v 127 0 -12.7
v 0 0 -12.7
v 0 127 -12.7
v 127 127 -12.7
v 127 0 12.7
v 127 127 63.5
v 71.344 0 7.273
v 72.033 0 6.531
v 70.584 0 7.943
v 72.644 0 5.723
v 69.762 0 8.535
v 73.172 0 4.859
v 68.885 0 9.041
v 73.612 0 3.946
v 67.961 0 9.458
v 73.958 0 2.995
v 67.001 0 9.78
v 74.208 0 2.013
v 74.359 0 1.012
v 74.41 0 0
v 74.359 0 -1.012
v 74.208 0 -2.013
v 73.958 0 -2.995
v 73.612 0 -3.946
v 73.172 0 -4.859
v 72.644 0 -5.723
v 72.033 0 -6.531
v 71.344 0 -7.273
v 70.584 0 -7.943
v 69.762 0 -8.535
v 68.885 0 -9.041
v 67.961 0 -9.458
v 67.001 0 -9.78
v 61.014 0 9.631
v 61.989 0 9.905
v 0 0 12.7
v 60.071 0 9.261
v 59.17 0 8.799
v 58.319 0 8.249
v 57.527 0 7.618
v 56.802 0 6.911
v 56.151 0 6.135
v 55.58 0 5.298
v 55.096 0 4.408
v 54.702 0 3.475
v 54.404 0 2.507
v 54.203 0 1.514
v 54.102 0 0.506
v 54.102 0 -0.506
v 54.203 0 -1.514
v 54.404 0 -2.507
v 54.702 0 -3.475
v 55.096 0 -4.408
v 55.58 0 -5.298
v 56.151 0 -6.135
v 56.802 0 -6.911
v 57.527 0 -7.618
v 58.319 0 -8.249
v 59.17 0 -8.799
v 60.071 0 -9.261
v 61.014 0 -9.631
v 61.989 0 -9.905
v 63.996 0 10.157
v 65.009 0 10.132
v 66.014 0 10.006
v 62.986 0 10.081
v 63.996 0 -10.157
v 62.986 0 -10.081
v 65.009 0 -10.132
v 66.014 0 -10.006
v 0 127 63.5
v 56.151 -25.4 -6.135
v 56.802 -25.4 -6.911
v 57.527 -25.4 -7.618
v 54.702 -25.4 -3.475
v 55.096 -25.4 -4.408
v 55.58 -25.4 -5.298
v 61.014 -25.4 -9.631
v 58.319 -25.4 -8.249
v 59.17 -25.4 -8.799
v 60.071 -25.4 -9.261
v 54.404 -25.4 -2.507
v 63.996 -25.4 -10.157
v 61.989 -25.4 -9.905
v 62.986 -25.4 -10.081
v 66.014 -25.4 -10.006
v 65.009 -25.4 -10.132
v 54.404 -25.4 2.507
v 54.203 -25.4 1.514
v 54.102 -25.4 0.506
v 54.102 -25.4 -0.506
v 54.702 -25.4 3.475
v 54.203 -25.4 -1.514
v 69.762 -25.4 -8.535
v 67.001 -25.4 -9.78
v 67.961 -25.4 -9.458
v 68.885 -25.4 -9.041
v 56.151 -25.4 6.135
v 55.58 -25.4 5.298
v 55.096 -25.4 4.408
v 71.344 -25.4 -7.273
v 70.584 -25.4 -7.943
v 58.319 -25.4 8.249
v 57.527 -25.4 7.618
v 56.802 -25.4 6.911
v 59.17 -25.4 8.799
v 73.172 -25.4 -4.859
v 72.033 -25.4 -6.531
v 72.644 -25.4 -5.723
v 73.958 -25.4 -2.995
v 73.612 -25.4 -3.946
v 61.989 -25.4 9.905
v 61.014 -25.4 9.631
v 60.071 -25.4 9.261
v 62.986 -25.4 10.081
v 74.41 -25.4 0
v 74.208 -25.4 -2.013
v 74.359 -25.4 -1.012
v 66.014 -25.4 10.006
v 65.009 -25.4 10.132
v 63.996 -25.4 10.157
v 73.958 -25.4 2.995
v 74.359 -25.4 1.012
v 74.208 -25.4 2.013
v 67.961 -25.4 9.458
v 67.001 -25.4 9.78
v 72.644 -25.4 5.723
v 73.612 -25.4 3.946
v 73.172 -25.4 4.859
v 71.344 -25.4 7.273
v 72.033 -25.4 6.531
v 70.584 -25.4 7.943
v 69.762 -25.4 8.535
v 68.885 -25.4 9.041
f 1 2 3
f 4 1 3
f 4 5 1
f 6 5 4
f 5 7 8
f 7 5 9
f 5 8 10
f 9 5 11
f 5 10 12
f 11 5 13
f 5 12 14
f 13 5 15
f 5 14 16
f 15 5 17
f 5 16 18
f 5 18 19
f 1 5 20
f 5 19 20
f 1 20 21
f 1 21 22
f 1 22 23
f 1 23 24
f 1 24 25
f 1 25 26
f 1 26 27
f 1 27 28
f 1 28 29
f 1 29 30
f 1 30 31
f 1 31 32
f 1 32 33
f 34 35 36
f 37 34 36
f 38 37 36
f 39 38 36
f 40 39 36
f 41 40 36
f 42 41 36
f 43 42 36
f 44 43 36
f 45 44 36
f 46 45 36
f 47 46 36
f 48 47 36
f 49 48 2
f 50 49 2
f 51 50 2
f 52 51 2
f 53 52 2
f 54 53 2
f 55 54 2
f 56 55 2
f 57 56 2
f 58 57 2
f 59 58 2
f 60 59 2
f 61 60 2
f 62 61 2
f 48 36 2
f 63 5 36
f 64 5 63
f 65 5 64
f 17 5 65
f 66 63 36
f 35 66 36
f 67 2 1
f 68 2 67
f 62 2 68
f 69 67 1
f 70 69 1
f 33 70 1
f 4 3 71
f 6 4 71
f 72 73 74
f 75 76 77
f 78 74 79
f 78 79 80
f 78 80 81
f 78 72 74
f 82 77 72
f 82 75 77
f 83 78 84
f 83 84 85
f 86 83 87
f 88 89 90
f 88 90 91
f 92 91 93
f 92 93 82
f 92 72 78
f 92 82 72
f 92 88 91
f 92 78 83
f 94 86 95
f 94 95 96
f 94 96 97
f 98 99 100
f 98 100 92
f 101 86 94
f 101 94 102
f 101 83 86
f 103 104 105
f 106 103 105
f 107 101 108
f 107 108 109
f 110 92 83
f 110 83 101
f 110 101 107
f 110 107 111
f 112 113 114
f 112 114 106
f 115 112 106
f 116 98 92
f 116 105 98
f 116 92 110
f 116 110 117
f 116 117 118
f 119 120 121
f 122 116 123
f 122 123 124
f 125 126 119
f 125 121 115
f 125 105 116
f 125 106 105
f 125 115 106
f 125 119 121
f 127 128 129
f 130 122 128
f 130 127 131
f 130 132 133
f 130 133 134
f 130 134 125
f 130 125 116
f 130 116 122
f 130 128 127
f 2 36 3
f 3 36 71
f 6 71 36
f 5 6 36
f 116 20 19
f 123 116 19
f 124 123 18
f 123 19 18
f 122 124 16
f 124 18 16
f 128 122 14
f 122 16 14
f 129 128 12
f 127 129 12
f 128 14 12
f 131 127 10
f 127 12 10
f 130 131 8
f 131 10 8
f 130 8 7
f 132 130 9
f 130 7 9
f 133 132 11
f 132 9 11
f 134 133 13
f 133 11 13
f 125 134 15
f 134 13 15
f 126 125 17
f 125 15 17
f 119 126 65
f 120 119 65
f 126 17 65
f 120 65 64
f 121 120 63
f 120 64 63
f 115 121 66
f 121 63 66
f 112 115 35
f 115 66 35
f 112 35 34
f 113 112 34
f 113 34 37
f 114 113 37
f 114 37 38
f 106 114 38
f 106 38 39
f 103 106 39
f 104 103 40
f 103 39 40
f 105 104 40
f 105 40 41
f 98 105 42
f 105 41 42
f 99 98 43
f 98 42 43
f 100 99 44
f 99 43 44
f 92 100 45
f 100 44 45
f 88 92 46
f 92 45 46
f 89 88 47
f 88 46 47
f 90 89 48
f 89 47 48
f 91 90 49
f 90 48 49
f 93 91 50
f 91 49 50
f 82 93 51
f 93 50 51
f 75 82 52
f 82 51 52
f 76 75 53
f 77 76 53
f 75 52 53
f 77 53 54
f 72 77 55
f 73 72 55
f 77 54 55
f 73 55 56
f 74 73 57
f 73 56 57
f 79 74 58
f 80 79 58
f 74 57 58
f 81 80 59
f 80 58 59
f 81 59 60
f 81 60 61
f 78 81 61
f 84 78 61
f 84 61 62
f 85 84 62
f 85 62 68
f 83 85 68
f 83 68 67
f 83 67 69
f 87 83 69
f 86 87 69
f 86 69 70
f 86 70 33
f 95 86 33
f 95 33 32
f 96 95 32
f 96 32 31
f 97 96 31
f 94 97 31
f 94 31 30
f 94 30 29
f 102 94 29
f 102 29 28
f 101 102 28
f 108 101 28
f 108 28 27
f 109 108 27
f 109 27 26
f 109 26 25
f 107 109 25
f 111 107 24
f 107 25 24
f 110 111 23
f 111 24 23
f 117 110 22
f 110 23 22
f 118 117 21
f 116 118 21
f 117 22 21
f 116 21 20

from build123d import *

# Parameters (mm, degrees)
F0_W     = 114.1541988105
F0_H     = 25.4
F1_DEPTH = 127
F2_R     = 10.16
F3_DEPTH = 25.4


# Not quite as in the source:
# - a feature names something its author has since deleted; it is built from what else it names


with BuildPart() as f1:
    # F0 (on Right) → F1 (new body)
    with BuildSketch(Plane.YZ):
        Polygon((127, 63.5), (0, 12.7), (12.8458011895, 12.7), (127, 12.7), align=None)
        with Locations((69.9229005948, 0)):
            Rectangle(F0_W, F0_H)
        Polygon((12.8458011895, 12.7), (0, 12.7), (0, 0), (0, -12.7), (12.8458011895, -12.7), align=None)
    extrude(amount=F1_DEPTH)

    # F2 (on face) → F3 (join)
    with BuildSketch(Plane.XZ):
        with Locations((64.2495304346, 0)):
            Circle(F2_R)
    extrude(amount=F3_DEPTH)


solid = f1.part
